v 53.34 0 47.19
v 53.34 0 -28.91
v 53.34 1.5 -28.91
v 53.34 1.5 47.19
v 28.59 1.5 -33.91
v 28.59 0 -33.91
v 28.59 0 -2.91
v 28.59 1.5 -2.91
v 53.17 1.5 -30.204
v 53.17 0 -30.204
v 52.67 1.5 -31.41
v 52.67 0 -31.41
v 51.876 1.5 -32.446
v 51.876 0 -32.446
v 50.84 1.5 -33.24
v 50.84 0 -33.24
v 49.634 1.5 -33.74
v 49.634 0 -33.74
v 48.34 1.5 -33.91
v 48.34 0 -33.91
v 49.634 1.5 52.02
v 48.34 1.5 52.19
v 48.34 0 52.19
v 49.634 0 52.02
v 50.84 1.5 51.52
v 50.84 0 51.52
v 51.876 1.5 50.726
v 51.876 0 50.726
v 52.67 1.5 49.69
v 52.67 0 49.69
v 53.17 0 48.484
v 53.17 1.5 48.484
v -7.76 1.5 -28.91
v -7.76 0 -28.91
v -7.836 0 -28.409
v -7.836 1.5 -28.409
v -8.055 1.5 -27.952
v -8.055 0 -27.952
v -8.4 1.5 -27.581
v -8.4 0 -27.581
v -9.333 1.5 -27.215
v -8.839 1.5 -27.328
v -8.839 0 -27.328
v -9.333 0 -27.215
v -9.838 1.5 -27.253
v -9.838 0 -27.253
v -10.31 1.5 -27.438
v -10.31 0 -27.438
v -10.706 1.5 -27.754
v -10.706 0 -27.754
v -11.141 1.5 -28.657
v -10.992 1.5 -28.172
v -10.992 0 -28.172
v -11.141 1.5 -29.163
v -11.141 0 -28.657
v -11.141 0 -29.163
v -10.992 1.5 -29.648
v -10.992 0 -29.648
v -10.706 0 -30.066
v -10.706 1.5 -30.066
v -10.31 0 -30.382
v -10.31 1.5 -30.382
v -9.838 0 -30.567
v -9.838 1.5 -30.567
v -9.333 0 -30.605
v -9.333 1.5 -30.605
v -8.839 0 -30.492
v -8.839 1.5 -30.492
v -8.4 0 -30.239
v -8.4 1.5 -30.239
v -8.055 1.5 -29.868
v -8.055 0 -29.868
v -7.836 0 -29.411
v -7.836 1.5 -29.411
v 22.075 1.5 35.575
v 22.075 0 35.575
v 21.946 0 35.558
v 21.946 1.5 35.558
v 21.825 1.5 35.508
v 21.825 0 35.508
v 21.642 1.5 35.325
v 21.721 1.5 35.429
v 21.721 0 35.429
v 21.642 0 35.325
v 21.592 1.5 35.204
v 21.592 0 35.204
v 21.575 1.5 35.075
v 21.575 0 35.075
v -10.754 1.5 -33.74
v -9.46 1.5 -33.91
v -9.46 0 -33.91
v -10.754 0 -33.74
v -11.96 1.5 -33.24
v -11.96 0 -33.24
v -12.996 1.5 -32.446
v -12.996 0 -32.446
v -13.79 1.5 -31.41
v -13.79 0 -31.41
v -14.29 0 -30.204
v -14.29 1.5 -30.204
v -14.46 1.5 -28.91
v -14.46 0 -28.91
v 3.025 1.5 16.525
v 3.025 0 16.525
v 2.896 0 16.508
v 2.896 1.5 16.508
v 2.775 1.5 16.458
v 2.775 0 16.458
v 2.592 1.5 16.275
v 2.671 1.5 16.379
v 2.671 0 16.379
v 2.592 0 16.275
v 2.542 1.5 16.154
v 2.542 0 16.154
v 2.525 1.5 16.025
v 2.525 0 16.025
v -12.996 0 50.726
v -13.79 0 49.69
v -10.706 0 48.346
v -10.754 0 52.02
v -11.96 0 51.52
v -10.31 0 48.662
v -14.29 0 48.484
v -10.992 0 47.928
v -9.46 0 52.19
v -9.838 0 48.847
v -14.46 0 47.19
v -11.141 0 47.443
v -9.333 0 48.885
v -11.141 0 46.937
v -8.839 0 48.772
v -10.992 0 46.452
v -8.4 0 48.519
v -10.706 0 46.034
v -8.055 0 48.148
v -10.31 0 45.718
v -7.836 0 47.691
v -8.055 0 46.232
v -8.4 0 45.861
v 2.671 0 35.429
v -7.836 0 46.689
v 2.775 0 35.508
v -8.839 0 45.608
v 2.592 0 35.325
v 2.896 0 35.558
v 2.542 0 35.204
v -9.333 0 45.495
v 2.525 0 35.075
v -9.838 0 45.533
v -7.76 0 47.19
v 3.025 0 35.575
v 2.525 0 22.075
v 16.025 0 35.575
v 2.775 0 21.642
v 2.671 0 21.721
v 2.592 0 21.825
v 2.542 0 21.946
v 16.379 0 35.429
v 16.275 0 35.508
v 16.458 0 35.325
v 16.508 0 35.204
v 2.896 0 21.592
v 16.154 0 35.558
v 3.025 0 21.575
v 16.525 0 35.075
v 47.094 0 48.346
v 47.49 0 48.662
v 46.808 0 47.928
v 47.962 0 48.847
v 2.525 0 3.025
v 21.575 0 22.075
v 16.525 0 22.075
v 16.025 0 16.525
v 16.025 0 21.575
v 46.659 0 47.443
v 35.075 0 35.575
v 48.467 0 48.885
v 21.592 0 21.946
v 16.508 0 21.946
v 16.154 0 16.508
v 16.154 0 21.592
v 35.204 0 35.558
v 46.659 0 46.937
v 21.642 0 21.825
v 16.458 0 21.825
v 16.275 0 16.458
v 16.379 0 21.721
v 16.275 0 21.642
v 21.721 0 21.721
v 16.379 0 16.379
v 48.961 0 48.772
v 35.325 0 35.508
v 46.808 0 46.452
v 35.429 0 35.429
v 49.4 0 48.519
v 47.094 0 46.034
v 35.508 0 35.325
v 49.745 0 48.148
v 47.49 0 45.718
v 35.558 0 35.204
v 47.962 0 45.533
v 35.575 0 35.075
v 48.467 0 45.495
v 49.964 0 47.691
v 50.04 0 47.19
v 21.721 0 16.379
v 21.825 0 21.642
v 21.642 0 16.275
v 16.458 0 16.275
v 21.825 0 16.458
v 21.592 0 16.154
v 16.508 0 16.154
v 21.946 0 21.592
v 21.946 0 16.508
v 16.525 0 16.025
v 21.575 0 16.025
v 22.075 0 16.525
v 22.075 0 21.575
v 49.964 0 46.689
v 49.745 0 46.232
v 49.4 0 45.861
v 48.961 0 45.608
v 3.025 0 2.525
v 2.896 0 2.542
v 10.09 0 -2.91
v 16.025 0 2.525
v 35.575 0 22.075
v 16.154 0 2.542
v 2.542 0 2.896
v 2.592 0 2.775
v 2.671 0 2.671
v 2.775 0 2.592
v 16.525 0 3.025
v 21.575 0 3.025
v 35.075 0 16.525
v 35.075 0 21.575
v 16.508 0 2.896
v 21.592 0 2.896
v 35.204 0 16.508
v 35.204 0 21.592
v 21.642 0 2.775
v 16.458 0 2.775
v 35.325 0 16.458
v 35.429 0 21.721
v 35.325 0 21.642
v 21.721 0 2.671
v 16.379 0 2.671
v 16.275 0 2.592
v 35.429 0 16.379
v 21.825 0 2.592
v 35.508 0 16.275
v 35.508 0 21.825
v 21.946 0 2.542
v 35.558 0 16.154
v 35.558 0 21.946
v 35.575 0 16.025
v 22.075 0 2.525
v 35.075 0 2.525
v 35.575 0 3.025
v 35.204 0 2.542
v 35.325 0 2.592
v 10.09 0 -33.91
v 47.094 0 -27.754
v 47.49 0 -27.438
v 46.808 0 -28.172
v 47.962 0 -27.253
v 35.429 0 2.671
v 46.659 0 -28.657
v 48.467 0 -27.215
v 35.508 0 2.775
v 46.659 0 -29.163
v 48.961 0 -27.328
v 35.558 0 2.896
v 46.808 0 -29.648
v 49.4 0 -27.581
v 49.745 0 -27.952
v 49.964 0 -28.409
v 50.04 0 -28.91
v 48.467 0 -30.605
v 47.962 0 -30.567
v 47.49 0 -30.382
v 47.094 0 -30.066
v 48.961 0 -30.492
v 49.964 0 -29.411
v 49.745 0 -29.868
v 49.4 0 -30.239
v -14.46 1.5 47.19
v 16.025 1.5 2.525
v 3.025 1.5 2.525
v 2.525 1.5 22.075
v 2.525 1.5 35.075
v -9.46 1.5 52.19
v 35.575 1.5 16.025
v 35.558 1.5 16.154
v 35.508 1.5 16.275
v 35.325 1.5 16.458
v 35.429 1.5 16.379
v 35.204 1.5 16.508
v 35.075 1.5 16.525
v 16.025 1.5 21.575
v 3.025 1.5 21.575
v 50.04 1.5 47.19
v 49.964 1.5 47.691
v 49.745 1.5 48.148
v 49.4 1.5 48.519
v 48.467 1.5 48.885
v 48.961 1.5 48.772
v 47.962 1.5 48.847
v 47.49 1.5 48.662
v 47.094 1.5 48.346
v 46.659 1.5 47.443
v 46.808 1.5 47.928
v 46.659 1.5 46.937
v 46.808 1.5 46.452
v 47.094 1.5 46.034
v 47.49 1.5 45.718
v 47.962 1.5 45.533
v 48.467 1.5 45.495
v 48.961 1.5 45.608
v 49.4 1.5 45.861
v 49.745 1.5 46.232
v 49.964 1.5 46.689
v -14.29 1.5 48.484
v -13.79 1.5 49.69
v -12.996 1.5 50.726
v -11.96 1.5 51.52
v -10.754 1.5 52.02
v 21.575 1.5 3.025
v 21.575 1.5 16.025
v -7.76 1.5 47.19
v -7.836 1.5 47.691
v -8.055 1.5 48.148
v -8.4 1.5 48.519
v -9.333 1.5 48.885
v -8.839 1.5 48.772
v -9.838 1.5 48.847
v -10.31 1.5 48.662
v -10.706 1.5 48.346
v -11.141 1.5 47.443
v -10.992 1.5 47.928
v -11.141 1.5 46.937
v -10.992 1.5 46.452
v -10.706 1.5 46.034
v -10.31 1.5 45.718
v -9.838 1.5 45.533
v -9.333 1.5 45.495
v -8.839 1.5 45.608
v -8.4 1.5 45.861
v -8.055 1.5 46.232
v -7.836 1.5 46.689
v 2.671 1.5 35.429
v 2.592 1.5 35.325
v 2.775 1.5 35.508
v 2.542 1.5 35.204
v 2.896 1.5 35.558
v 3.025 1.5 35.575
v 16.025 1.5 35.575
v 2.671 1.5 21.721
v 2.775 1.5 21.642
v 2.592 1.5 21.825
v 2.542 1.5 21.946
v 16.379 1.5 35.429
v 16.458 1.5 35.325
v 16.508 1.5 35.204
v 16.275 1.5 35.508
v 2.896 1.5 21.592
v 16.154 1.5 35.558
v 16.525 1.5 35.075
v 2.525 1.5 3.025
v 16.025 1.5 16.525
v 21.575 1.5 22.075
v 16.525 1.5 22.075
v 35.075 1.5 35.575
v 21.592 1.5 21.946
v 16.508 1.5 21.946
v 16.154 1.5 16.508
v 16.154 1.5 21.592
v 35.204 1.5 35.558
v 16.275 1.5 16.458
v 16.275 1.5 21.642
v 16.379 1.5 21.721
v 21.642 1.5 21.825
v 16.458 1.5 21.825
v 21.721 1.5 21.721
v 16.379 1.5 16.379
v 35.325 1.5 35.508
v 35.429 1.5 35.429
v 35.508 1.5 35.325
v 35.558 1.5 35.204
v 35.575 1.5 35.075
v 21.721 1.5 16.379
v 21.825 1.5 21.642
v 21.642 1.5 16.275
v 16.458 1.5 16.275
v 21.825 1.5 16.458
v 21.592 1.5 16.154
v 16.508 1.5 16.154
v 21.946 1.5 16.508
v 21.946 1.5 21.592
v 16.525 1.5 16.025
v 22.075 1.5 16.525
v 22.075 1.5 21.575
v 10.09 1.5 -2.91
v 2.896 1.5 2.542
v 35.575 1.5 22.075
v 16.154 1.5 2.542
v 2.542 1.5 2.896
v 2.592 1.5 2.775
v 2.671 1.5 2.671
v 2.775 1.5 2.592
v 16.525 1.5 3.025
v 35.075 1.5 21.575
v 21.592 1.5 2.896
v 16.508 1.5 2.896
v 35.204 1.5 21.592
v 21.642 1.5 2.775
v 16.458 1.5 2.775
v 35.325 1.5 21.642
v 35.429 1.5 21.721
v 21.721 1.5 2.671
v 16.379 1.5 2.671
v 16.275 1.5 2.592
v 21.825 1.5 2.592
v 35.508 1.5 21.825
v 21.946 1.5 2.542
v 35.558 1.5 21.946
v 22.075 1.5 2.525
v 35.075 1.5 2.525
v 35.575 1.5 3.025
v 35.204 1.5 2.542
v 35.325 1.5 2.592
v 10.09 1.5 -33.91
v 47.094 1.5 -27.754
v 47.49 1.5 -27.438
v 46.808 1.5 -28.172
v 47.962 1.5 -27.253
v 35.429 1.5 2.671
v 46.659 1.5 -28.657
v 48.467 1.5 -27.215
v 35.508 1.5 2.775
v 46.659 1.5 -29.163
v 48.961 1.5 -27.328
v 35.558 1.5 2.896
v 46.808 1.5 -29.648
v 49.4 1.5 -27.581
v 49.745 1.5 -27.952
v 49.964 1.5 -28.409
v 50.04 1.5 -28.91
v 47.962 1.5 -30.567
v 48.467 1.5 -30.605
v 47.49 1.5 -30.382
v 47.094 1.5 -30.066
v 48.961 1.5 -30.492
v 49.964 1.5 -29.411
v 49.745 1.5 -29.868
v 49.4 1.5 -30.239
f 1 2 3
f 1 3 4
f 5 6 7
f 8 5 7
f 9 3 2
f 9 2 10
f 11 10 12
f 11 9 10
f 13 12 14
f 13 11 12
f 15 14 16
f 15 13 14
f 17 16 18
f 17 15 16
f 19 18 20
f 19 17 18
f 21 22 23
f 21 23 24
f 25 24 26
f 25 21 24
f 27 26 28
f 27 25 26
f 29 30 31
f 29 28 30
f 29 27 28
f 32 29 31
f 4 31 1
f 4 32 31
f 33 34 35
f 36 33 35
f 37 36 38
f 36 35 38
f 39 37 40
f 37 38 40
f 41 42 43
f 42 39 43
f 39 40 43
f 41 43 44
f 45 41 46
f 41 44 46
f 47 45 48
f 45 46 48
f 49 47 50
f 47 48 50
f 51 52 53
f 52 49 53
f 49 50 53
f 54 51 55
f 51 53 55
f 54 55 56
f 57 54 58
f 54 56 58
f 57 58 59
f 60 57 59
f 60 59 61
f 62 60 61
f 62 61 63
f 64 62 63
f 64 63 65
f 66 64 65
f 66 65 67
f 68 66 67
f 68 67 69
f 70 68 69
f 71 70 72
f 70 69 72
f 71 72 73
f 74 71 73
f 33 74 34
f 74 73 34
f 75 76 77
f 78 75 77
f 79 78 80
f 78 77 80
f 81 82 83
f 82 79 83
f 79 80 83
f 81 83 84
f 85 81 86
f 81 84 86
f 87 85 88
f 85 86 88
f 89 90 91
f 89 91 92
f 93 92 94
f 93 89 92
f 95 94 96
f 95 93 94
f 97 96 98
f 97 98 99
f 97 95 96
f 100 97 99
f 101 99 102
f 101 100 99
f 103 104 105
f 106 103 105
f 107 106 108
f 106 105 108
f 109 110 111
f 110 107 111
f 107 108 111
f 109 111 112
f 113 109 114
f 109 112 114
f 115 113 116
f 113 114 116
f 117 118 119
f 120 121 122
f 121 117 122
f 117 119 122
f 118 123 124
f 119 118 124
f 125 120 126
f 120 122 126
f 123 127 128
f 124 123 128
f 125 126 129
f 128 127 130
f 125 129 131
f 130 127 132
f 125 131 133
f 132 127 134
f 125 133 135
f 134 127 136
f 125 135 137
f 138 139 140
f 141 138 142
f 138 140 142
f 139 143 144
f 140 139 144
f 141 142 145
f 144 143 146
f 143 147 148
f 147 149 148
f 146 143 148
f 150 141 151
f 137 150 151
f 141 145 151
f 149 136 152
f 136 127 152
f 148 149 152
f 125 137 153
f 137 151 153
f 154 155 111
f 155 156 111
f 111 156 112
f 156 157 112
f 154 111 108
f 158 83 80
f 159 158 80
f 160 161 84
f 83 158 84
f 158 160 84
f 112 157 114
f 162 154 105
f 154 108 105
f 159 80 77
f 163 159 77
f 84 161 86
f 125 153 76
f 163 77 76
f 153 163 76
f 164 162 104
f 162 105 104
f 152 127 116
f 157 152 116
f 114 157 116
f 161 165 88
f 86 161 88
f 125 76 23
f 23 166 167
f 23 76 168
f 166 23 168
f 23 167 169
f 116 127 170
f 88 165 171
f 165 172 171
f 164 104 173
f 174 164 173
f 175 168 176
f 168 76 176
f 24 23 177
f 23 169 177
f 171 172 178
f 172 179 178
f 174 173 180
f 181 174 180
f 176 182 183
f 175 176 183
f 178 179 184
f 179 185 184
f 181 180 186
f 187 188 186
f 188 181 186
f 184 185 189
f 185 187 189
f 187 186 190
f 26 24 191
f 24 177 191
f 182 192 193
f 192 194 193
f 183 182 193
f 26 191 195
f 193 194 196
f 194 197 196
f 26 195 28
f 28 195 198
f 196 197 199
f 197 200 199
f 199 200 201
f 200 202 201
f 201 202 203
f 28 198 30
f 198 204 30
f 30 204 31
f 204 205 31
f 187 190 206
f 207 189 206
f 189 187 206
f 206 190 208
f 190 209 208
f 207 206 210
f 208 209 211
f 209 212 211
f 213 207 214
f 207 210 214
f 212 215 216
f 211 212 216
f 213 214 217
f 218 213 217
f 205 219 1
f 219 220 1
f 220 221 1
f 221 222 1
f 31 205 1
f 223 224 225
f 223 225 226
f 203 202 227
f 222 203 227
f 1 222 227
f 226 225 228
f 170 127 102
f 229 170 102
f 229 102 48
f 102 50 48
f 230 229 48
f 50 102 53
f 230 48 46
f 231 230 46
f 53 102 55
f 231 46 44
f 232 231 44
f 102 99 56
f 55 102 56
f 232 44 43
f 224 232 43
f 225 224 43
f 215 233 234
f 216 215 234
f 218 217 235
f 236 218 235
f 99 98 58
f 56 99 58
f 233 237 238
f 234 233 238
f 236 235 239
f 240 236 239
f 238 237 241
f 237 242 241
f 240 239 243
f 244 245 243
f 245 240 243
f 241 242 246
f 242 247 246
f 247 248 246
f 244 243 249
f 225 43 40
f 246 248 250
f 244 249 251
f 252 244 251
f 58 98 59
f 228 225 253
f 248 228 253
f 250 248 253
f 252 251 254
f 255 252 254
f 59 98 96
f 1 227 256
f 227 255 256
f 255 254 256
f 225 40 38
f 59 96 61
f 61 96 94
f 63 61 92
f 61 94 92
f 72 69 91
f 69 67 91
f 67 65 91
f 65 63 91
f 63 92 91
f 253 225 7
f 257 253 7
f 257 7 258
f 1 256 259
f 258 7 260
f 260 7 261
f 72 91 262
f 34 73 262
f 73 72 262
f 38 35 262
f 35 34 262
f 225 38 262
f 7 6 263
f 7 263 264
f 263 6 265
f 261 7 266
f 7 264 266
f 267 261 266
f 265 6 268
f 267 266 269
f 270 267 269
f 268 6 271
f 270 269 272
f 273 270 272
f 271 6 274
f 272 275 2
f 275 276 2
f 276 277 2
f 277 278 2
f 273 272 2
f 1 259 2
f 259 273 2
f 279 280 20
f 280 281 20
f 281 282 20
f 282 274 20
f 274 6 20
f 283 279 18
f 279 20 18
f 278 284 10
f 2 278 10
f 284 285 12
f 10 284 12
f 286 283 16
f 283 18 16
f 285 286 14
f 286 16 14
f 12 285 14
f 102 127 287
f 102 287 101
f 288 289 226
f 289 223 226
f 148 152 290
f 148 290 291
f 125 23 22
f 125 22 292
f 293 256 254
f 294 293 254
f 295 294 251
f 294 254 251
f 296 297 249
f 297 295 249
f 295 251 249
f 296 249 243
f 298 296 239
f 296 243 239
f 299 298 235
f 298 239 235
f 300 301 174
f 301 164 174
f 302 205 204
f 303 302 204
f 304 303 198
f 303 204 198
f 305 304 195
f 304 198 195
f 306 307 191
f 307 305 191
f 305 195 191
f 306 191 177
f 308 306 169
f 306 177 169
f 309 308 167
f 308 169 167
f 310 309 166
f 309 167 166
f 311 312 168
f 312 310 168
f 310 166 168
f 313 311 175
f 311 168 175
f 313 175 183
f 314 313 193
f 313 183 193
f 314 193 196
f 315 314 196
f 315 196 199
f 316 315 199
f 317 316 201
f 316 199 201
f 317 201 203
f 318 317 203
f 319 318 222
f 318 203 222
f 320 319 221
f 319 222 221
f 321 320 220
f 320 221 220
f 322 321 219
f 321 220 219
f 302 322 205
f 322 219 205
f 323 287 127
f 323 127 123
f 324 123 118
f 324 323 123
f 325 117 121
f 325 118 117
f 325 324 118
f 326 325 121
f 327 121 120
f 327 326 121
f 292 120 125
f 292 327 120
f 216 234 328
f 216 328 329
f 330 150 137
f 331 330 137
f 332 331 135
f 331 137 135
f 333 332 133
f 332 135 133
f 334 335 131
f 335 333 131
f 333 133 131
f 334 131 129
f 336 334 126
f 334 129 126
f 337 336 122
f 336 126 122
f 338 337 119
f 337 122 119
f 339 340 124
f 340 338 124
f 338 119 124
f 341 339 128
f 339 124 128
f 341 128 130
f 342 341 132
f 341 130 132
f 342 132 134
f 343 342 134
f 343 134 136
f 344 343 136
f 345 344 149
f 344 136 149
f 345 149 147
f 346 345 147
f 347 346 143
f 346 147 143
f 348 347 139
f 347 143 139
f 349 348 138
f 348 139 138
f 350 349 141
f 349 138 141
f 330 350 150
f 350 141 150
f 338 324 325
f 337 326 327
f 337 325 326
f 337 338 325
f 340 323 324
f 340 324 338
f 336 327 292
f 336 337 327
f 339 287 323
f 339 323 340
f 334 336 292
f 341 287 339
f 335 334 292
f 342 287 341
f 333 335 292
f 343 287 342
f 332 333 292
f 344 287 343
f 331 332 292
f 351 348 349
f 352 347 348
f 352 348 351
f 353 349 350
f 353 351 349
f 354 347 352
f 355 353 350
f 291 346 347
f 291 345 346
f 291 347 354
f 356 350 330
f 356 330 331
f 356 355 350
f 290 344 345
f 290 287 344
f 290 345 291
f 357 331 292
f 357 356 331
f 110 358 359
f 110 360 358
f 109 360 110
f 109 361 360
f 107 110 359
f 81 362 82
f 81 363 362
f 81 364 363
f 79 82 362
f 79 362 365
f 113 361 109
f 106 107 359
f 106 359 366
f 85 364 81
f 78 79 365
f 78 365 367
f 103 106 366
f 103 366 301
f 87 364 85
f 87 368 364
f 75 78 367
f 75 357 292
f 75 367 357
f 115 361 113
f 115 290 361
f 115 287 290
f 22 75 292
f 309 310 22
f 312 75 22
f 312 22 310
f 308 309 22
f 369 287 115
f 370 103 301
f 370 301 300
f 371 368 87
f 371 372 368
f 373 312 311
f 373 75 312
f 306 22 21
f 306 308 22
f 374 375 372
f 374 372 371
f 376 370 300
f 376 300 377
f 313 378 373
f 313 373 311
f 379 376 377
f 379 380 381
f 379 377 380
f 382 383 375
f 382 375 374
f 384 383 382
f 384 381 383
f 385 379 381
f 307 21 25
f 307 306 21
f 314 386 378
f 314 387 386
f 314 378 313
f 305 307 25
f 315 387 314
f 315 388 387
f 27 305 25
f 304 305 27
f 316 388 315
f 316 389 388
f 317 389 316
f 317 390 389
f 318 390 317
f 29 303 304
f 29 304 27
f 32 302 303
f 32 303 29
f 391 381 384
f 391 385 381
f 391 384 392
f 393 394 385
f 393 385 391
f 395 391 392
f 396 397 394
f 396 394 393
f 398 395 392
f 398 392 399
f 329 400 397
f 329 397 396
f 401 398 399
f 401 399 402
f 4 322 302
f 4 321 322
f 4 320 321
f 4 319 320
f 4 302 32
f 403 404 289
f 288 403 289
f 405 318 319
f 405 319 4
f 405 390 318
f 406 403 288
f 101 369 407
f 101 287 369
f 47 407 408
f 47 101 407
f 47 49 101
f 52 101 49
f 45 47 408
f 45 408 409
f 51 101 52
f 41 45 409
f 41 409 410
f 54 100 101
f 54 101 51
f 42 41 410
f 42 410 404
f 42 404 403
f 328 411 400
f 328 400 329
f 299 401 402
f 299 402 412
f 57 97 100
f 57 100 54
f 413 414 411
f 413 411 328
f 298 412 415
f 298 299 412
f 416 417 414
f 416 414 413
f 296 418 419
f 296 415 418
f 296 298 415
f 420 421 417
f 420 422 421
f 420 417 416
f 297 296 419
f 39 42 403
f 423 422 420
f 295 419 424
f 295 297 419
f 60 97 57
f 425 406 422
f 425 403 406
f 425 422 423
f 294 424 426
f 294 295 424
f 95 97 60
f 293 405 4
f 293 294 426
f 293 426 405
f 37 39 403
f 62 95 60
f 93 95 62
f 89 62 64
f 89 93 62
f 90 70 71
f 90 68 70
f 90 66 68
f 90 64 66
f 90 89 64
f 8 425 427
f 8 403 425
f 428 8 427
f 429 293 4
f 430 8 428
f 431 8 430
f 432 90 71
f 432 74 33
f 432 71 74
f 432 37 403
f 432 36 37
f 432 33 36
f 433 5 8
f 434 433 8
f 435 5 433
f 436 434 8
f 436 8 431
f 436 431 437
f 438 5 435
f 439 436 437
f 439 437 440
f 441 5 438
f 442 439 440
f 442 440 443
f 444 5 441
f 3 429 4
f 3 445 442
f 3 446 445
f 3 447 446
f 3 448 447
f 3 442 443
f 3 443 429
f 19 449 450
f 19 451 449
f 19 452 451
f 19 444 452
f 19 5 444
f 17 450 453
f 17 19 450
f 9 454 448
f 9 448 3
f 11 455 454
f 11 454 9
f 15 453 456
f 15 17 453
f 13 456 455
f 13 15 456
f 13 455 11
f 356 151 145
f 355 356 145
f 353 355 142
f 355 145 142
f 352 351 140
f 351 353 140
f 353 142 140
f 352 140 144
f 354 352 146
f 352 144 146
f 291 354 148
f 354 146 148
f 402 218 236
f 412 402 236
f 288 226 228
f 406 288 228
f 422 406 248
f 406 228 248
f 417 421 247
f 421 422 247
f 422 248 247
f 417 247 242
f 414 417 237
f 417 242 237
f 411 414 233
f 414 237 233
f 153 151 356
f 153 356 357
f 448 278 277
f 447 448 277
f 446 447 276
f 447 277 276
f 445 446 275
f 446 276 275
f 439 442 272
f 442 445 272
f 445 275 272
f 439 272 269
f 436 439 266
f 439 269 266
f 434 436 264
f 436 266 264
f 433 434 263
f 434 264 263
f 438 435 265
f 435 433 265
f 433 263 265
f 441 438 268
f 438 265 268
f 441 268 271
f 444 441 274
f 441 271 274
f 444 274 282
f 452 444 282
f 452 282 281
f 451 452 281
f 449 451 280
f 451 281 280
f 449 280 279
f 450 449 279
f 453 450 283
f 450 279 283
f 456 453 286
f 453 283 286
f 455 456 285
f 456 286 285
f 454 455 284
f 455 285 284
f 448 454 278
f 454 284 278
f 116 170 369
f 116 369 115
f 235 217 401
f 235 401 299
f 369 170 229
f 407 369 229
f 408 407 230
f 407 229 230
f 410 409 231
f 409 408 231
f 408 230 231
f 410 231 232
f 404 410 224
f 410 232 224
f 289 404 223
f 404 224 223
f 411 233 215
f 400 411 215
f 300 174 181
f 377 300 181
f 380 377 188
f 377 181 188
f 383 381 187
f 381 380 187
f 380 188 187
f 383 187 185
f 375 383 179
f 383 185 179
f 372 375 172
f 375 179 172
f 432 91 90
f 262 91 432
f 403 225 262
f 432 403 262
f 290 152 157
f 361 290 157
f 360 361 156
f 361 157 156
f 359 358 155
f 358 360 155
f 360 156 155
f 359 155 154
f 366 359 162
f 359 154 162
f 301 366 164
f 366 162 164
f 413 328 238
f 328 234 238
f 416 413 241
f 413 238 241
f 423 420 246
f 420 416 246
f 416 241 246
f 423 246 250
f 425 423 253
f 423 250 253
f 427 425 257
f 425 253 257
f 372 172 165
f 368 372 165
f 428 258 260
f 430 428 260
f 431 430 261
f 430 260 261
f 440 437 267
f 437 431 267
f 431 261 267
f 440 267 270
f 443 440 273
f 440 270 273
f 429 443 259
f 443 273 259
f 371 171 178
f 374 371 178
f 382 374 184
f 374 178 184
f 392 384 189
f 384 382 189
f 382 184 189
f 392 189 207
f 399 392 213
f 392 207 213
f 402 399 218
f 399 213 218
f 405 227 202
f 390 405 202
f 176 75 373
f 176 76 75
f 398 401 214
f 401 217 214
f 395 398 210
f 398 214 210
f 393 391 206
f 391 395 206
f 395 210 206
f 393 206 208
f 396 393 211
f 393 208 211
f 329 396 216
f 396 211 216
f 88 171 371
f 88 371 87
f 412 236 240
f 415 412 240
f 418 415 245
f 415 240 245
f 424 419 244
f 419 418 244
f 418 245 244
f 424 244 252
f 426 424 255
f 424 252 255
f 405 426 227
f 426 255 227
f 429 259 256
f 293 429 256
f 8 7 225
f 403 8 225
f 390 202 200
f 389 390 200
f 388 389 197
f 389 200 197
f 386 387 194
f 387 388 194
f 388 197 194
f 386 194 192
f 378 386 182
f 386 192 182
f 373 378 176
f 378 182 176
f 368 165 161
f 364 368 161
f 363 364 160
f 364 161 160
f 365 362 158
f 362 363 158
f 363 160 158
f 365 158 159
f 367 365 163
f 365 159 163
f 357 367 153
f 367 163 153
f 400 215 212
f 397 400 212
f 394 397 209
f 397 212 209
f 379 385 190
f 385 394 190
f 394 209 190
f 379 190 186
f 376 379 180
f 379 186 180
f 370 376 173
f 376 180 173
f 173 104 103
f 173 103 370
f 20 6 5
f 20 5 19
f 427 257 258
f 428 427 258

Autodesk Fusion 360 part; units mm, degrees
sketch "Boceto1" plane through (0, 0, 0) normal (0, 1, 0) x (1, 0, 0)
  line L0 (3.025, -2.525) -> (16.025, -2.525)
  line L1 (3.025, -16.525) -> (16.025, -16.525)
  line L2 (2.525, -3.025) -> (2.525, -16.025)
  line L3 (16.525, -3.025) -> (16.525, -16.025)
  arc A0 (3.025, -2.525) -> (2.525, -3.025) centre (3.025, -3.025) ccw
  arc A1 (16.525, -3.025) -> (16.025, -2.525) centre (16.025, -3.025) ccw
  arc A2 (2.525, -16.025) -> (3.025, -16.525) centre (3.025, -16.025) ccw
  arc A3 (16.025, -16.525) -> (16.525, -16.025) centre (16.025, -16.025) ccw
  line L4 (22.075, -2.525) -> (35.075, -2.525)
  line L5 (22.075, -16.525) -> (35.075, -16.525)
  line L6 (21.575, -3.025) -> (21.575, -16.025)
  line L7 (35.575, -3.025) -> (35.575, -16.025)
  arc A4 (22.075, -2.525) -> (21.575, -3.025) centre (22.075, -3.025) ccw
  arc A5 (35.575, -3.025) -> (35.075, -2.525) centre (35.075, -3.025) ccw
  arc A6 (21.575, -16.025) -> (22.075, -16.525) centre (22.075, -16.025) ccw
  arc A7 (35.075, -16.525) -> (35.575, -16.025) centre (35.075, -16.025) ccw
  line L8 (3.025, -21.575) -> (16.025, -21.575)
  line L9 (3.025, -35.575) -> (16.025, -35.575)
  line L10 (2.525, -22.075) -> (2.525, -35.075)
  line L11 (16.525, -22.075) -> (16.525, -35.075)
  arc A8 (3.025, -21.575) -> (2.525, -22.075) centre (3.025, -22.075) ccw
  arc A9 (16.525, -22.075) -> (16.025, -21.575) centre (16.025, -22.075) ccw
  arc A10 (2.525, -35.075) -> (3.025, -35.575) centre (3.025, -35.075) ccw
  arc A11 (16.025, -35.575) -> (16.525, -35.075) centre (16.025, -35.075) ccw
  line L12 (22.075, -21.575) -> (35.075, -21.575)
  line L13 (22.075, -35.575) -> (35.075, -35.575)
  line L14 (21.575, -22.075) -> (21.575, -35.075)
  line L15 (35.575, -22.075) -> (35.575, -35.075)
  arc A12 (22.075, -21.575) -> (21.575, -22.075) centre (22.075, -22.075) ccw
  arc A13 (35.575, -22.075) -> (35.075, -21.575) centre (35.075, -22.075) ccw
  arc A14 (21.575, -35.075) -> (22.075, -35.575) centre (22.075, -35.075) ccw
  arc A15 (35.075, -35.575) -> (35.575, -35.075) centre (35.075, -35.075) ccw
  line L16 (-14.46, 33.91) -> (53.34, 33.91)
  line L17 (53.34, 33.91) -> (53.34, -52.19)
  line L18 (53.34, -52.19) -> (-14.46, -52.19)
  line L19 (-14.46, -52.19) -> (-14.46, 33.91)
  line L20 (10.09, 33.91) -> (28.59, 33.91)
  line L21 (28.59, 33.91) -> (28.59, 2.91)
  line L22 (28.59, 2.91) -> (10.09, 2.91)
  line L23 (10.09, 2.91) -> (10.09, 33.91)
  circle A16 centre (-9.46, 28.91) radius 1.7
  circle A17 centre (48.34, 28.91) radius 1.7
  circle A18 centre (-9.46, -47.19) radius 1.7
  circle A19 centre (48.34, -47.19) radius 1.7
  dimension "d1" = 86.1
  dimension "d2" = 67.8
  dimension "d3" = 16.615
  dimension "d4" = 16.985
  dimension "d5" = 17.765
  dimension "d6" = 18.5
  dimension "d7" = 31
  dimension "d8" = 24.55
  dimension "d9" = 3.4
  dimension "d10" = 3.4
  dimension "d11" = 3.4
  dimension "d12" = 3.4
  dimension "d13" = 5
  dimension "d14" = 5
  dimension "d15" = 5
  dimension "d16" = 5
  dimension "d17" = 5
  dimension "d18" = 5
  dimension "d19" = 5
  dimension "d20" = 5
extrude "Extruir1" add sketch "Boceto1" along normal blind 1.5 contours L16 L17 L18 L19 L21 L22 L23
fillet "Empalme1" radius 5 4 edges at (-14.46, 0.75, 52.19) (53.34, 0.75, 52.19) (-14.46, 0.75, -33.91) (53.34, 0.75, -33.91)
